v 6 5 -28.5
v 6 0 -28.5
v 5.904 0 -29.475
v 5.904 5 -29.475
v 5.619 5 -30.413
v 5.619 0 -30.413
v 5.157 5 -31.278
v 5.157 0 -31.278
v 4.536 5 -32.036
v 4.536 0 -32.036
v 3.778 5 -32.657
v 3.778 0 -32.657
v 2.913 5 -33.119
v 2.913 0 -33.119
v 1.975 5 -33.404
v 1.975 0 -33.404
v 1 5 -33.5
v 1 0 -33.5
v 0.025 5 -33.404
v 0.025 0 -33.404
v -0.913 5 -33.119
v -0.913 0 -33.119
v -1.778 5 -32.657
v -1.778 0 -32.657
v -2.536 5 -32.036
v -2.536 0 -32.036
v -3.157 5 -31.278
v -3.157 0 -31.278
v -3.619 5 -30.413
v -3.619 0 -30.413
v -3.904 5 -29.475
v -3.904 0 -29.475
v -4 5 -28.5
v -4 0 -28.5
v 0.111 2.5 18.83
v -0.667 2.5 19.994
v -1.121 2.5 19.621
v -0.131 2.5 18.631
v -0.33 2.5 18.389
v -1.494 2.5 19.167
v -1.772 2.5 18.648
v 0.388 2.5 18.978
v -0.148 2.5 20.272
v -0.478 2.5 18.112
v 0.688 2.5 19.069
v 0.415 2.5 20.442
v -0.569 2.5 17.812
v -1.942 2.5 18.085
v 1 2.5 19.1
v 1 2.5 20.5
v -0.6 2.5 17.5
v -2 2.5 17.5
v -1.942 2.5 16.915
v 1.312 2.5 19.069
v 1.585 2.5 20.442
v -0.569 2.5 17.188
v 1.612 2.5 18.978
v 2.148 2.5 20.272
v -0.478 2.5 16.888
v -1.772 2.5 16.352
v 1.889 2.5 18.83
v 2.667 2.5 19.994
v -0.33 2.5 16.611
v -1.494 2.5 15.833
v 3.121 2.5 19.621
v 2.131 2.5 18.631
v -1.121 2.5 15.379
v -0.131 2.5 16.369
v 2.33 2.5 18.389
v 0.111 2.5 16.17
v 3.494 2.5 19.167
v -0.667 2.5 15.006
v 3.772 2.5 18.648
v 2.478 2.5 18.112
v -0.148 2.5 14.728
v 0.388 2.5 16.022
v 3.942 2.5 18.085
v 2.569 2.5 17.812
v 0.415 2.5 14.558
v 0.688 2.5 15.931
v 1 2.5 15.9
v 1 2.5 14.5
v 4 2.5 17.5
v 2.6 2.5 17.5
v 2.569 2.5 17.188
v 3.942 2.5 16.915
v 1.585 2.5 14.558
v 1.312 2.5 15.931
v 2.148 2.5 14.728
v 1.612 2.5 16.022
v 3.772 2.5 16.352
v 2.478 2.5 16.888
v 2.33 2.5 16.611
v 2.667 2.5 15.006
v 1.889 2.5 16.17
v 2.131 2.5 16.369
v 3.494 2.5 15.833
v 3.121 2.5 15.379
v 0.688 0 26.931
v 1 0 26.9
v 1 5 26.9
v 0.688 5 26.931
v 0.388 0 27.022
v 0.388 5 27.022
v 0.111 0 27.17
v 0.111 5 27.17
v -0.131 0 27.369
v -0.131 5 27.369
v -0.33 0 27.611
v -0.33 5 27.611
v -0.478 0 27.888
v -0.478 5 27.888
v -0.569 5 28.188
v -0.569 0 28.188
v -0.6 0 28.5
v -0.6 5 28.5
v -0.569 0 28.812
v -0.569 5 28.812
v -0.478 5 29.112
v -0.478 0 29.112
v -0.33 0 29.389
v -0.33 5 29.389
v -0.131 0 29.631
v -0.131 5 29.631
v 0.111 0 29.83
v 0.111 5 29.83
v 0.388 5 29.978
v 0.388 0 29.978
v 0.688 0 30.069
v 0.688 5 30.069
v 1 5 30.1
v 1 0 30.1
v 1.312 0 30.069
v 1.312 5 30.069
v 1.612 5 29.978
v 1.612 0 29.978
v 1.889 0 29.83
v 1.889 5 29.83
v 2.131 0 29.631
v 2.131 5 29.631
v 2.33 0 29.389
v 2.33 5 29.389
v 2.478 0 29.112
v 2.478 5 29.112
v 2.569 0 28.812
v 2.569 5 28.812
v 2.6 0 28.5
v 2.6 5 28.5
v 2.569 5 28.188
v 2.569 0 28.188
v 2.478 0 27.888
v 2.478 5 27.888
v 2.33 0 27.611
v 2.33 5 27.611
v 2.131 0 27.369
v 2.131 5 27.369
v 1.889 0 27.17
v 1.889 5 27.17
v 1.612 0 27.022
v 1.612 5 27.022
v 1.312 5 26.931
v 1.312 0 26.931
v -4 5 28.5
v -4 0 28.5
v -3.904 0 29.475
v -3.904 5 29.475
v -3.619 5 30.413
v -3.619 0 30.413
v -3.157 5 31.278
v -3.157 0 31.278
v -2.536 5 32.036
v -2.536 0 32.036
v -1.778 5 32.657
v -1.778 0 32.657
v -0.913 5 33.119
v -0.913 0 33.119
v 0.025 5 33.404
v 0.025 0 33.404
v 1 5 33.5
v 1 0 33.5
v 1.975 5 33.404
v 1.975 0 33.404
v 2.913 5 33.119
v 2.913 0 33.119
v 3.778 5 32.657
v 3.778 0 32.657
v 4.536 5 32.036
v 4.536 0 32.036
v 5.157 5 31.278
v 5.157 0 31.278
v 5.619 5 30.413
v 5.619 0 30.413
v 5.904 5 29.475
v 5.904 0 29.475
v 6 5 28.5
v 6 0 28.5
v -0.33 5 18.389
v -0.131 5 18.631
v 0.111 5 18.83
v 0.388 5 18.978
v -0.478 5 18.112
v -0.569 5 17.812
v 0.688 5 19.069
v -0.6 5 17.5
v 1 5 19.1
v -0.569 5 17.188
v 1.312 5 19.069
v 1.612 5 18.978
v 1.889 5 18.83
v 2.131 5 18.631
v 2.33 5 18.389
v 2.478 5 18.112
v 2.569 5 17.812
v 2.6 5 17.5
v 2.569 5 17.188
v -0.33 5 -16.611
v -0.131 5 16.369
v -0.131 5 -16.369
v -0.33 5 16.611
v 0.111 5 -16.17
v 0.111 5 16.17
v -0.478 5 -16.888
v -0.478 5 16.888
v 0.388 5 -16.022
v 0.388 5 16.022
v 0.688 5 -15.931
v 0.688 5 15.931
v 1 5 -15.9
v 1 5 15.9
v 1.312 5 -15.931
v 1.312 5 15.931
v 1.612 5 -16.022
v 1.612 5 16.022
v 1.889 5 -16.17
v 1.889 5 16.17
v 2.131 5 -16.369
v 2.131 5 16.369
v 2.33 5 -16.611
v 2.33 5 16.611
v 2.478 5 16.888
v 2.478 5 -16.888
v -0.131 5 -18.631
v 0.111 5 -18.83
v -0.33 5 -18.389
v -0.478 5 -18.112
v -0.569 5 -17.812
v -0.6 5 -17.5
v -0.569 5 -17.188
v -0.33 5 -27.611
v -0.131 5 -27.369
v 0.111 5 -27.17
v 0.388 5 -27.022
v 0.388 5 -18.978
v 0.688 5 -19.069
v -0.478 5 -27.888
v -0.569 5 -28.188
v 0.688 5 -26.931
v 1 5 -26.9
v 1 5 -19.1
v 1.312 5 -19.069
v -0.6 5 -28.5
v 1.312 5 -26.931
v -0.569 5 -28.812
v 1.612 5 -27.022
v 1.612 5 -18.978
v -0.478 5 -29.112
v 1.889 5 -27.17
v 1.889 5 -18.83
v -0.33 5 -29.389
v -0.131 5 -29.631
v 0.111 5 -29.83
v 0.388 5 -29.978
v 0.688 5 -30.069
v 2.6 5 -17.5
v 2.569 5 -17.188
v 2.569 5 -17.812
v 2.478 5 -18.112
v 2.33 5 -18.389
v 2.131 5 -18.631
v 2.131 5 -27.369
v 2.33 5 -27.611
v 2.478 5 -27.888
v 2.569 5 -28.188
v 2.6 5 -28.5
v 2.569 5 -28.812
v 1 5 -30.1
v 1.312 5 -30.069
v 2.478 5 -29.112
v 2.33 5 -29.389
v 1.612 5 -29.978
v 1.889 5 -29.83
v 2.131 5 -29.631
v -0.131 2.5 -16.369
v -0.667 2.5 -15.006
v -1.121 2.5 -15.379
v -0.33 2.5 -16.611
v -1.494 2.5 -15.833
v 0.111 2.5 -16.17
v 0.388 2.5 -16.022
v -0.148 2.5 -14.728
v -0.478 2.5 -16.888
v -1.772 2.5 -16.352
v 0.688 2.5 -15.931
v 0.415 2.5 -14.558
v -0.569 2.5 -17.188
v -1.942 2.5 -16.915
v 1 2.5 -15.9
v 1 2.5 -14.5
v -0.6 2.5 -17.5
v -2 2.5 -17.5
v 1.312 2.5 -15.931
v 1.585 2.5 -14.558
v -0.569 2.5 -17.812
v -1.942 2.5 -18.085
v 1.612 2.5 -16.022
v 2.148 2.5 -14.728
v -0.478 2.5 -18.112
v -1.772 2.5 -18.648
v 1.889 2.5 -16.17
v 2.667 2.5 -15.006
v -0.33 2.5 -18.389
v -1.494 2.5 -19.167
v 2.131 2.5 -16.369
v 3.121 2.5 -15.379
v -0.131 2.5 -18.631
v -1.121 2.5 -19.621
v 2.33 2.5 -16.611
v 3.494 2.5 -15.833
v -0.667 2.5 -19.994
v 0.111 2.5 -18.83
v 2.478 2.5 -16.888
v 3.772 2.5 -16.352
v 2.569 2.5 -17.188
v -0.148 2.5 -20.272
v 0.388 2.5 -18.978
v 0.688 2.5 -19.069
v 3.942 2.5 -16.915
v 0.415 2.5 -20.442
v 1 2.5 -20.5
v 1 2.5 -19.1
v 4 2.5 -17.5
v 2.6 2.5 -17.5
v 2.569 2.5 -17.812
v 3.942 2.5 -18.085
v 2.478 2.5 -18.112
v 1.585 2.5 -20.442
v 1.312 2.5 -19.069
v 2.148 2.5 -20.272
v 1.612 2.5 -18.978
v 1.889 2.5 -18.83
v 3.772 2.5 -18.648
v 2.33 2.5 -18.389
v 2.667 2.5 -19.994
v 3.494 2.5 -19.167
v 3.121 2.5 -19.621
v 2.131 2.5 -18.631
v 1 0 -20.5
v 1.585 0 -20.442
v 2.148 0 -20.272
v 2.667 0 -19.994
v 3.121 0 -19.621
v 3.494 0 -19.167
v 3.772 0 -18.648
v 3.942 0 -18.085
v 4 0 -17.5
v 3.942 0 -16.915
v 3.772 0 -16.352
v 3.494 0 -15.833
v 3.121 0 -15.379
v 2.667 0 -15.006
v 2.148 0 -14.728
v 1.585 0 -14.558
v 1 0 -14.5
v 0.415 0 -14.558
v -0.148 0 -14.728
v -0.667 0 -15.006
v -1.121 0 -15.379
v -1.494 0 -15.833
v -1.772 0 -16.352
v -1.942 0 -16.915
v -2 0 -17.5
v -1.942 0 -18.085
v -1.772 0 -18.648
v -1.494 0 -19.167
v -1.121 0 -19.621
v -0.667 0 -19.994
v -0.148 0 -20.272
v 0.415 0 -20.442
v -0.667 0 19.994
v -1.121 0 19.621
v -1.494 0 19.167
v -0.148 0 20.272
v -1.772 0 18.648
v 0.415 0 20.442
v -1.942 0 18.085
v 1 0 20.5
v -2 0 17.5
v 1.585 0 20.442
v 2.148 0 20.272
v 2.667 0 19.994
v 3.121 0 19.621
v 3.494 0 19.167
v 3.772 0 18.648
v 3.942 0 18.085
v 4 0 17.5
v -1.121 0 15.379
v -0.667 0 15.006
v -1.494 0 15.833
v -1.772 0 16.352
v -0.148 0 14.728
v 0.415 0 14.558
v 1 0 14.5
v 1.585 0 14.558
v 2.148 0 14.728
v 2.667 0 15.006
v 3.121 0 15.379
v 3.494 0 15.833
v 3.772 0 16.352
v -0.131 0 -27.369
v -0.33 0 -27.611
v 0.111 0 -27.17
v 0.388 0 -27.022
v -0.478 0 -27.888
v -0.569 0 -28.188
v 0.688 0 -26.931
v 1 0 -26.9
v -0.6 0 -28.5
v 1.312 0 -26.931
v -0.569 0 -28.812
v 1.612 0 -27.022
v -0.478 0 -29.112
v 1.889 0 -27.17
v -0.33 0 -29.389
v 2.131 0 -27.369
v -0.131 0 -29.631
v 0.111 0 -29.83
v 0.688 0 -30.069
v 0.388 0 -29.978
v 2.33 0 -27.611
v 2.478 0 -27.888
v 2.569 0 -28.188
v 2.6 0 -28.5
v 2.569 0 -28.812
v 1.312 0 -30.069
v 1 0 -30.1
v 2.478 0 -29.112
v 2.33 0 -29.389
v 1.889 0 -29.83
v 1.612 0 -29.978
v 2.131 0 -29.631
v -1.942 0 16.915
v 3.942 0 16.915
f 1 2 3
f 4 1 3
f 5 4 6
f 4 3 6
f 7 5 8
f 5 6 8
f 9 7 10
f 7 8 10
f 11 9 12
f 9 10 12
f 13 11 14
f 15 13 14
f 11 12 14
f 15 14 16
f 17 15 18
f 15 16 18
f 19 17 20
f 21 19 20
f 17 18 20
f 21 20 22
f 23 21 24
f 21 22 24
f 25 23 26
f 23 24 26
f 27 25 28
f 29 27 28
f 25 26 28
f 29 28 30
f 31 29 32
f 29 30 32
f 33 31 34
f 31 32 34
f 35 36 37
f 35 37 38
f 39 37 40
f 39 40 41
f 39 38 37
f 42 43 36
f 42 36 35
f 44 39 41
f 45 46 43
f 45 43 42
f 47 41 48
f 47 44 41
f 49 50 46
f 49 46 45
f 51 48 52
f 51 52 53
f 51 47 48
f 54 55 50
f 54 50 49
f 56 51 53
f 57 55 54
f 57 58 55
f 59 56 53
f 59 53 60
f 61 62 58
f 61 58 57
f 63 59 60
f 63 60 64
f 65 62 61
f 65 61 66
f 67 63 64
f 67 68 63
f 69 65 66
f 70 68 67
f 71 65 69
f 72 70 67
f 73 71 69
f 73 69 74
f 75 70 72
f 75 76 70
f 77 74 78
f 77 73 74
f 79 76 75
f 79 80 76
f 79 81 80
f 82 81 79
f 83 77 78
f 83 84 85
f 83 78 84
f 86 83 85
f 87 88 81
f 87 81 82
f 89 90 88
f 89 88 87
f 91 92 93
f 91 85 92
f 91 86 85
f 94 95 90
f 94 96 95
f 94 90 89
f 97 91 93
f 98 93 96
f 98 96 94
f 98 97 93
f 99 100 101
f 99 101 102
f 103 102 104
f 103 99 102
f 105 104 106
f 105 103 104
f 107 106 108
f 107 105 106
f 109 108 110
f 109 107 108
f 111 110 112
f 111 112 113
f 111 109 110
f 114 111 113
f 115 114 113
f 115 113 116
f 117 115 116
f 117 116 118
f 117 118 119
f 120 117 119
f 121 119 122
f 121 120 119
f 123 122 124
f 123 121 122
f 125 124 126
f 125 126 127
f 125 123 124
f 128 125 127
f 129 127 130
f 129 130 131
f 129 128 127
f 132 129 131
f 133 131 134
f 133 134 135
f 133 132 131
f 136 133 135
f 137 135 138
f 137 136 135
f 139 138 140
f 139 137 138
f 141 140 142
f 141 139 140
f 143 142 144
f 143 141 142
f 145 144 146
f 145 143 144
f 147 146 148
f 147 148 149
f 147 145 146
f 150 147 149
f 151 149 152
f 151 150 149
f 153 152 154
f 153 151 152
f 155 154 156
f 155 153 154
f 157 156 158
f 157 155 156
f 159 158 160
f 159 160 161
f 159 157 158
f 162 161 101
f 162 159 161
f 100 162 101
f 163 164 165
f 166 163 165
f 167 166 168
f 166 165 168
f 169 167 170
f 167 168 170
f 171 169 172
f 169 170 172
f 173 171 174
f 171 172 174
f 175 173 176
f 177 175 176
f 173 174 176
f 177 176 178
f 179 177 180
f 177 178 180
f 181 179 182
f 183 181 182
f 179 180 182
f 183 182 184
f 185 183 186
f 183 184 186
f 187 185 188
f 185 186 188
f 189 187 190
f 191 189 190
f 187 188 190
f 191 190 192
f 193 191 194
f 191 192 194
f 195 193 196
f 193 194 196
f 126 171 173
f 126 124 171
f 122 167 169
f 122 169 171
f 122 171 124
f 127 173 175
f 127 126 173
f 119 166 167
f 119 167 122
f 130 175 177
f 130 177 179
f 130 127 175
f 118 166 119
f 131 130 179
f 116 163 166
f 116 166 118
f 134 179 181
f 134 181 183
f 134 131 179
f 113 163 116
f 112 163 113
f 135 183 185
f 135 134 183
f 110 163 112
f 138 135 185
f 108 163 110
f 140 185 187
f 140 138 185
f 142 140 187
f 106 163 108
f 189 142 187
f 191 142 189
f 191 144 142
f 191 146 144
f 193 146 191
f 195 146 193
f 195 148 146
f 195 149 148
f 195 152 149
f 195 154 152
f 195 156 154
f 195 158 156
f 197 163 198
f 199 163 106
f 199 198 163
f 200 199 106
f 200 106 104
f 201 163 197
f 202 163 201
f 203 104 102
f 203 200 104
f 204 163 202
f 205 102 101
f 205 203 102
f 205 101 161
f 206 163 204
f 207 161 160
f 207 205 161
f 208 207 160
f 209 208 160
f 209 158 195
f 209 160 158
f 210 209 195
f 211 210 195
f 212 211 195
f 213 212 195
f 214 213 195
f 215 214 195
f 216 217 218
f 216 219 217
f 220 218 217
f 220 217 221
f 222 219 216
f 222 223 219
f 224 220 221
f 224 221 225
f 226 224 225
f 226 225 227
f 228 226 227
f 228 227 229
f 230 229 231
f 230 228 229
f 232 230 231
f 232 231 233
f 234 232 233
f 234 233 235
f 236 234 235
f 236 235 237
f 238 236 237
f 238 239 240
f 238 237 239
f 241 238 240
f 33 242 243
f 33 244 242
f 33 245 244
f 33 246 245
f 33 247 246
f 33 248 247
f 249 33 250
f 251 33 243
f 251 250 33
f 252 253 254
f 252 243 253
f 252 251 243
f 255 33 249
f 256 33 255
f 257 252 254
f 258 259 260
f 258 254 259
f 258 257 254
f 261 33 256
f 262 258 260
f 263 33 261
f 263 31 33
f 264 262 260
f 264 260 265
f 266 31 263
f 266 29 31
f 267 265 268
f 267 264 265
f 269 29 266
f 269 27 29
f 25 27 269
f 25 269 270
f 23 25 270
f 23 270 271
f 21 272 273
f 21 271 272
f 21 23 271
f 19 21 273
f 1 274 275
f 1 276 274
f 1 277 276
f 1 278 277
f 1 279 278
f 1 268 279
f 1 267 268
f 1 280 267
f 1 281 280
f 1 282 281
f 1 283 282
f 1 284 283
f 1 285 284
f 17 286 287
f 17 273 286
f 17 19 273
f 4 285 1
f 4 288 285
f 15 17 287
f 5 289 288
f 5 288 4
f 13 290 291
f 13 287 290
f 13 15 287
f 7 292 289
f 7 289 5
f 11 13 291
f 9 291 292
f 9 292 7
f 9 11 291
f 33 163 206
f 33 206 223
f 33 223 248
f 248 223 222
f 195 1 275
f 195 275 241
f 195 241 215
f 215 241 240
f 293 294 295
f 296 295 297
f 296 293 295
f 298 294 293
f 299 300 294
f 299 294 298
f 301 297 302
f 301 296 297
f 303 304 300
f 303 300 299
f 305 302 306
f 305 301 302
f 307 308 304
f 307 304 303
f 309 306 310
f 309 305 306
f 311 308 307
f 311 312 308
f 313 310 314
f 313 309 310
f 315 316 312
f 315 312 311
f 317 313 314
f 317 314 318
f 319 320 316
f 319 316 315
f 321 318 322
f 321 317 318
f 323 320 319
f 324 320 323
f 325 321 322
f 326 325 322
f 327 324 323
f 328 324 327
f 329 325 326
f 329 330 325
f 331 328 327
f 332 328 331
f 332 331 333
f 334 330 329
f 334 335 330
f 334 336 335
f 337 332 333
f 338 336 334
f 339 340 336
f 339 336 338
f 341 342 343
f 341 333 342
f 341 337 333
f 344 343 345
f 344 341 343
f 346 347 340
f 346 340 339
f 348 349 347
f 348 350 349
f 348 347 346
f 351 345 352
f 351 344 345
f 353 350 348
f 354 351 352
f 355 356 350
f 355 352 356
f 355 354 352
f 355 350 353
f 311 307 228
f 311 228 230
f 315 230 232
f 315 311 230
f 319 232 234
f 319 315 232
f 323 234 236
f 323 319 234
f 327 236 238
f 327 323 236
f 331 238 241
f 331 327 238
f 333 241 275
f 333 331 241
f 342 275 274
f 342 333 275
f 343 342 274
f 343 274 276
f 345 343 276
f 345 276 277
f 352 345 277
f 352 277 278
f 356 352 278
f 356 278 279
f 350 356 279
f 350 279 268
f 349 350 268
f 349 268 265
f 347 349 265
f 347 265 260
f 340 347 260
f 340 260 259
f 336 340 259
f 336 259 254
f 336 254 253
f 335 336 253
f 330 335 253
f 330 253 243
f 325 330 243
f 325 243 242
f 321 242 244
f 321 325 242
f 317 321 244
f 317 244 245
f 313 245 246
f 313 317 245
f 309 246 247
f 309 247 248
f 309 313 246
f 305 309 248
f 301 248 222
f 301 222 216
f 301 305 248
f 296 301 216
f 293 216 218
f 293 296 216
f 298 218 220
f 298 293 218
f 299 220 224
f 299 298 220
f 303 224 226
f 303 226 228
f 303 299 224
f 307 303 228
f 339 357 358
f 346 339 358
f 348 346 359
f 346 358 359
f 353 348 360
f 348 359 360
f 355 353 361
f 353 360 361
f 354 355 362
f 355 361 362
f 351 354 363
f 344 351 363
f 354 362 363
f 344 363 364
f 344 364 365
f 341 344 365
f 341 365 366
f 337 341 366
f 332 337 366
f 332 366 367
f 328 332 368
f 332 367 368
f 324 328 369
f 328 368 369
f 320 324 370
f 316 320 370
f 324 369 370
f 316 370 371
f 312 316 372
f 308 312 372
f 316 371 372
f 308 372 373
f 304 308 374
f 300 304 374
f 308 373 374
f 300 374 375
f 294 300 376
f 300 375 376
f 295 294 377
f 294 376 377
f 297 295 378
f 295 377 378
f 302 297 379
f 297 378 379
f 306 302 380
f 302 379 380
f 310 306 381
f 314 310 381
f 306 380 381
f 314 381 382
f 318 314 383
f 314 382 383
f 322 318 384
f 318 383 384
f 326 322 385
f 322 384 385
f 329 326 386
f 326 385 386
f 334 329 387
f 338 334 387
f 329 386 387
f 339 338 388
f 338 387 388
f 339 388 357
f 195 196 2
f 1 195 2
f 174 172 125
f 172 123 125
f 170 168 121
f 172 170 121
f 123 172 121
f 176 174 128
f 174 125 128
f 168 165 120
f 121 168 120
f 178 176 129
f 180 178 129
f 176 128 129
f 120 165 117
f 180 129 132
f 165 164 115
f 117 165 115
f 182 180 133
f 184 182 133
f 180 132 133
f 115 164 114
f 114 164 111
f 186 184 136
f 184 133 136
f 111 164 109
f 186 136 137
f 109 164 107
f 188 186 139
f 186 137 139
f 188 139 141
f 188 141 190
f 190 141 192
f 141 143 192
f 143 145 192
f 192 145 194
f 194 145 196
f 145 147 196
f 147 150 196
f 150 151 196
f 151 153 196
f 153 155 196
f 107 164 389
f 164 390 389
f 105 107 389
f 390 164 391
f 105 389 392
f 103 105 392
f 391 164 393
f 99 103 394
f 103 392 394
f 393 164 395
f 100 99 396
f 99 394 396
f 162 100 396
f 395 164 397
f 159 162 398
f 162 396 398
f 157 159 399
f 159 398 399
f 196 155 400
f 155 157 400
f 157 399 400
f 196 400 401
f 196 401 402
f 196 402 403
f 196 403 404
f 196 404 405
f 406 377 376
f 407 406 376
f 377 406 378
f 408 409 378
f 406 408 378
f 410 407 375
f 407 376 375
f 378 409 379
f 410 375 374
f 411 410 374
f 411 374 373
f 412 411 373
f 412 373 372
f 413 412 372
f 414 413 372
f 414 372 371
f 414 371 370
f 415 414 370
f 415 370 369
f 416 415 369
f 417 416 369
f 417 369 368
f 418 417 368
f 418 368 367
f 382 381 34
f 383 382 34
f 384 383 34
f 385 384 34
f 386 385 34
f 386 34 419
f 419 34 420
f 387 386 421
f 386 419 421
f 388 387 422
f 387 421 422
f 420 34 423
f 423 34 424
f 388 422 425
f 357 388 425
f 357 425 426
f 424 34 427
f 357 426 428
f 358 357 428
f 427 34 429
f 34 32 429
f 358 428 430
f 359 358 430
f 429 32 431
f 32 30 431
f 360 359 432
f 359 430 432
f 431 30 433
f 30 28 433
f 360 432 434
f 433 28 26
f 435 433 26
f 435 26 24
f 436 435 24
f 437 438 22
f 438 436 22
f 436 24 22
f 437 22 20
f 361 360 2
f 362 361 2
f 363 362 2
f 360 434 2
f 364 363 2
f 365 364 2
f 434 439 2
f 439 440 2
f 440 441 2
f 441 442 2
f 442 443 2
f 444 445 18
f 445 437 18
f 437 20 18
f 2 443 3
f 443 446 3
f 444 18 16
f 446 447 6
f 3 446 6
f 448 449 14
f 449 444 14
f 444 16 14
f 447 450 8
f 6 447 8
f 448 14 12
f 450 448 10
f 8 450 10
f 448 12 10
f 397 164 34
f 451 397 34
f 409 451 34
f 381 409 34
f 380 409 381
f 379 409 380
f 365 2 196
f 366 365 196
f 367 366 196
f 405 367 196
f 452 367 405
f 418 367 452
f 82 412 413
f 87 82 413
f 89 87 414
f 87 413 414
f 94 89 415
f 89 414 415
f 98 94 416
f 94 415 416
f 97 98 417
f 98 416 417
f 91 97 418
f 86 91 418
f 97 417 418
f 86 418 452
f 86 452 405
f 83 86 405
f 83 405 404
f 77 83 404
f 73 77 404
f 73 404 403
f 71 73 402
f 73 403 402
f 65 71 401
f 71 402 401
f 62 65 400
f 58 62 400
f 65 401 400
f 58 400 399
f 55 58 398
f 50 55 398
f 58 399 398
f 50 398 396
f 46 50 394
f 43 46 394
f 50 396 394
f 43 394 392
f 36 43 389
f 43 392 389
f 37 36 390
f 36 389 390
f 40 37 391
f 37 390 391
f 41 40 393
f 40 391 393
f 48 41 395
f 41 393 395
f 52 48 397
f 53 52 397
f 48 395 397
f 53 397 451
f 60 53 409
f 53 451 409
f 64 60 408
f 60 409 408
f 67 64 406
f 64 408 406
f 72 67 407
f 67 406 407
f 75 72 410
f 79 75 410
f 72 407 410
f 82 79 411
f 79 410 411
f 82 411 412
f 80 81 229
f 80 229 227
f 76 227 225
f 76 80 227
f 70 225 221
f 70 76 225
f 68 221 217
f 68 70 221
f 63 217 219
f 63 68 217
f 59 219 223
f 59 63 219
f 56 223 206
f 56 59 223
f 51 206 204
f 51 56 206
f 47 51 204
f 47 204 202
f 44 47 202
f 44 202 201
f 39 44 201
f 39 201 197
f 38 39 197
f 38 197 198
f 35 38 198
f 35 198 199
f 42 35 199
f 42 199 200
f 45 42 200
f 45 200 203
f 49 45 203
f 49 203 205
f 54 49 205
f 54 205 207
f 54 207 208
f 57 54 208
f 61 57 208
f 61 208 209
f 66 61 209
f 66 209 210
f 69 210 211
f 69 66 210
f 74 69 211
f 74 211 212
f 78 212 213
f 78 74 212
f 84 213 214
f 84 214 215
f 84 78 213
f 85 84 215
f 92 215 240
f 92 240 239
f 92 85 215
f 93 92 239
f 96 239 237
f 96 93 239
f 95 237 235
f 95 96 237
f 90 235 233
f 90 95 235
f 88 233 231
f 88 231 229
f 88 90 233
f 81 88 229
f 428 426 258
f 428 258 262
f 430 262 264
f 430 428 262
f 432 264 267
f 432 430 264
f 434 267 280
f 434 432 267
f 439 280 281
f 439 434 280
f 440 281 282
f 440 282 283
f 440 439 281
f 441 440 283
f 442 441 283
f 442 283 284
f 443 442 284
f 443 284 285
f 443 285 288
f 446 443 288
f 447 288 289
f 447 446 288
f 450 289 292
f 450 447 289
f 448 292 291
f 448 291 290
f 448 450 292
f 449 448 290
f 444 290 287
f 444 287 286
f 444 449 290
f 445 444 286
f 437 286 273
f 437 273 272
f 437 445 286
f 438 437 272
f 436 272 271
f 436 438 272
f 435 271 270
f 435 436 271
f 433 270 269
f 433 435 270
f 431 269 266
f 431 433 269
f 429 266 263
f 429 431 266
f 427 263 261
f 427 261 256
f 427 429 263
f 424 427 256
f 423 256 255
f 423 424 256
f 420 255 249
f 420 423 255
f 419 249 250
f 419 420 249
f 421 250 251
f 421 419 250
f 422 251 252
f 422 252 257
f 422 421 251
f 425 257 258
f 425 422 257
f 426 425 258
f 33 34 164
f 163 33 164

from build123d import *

# Parameters (mm, degrees)
SKIZZE2_R                       = 1.6
AUFSATZ_LINEAR_AUSTRAGEN1_DEPTH = 5
SKIZZE3_R                       = 3
SCHNITT_LINEAR_AUSTRAGEN1_DEPTH = 2.5


with BuildPart() as part:
    # Skizze2 → Aufsatz-Linear austragen1 (new body)
    with BuildSketch(Plane(origin=(0, 0, 0), x_dir=(1, 0, 0), z_dir=(0, 1, 0))):
        with BuildLine():
            Line((-4, 28.5), (-4, -28.5))
            ThreePointArc((-4, -28.5), (1, -33.5), (6, -28.5))
            Line((6, -28.5), (6, 28.5))
            ThreePointArc((6, 28.5), (1, 33.5), (-4, 28.5))
        make_face()
        with Locations(Location((1, 28.5, 0), (0, 0, 270))):
            Circle(SKIZZE2_R, mode=Mode.SUBTRACT)
        with Locations(Location((1, 17.5, 0), (0, 0, 270))):
            Circle(SKIZZE2_R, mode=Mode.SUBTRACT)
        with Locations(Location((1, -17.5, 0), (0, 0, 90))):
            Circle(SKIZZE2_R, mode=Mode.SUBTRACT)
        with Locations(Location((1, -28.5, 0), (0, 0, 90))):
            Circle(SKIZZE2_R, mode=Mode.SUBTRACT)
    extrude(amount=AUFSATZ_LINEAR_AUSTRAGEN1_DEPTH)

    # Skizze3 → Schnitt-Linear austragen1 (cut)
    with BuildSketch(Plane.XZ):
        with Locations(Location((1, 17.5, 0), (0, 0, 270))):
            Circle(SKIZZE3_R)
        with Locations(Location((1, -17.5, 0), (0, 0, 270))):
            Circle(SKIZZE3_R)
    extrude(amount=-SCHNITT_LINEAR_AUSTRAGEN1_DEPTH, mode=Mode.SUBTRACT)


solid = part.part
